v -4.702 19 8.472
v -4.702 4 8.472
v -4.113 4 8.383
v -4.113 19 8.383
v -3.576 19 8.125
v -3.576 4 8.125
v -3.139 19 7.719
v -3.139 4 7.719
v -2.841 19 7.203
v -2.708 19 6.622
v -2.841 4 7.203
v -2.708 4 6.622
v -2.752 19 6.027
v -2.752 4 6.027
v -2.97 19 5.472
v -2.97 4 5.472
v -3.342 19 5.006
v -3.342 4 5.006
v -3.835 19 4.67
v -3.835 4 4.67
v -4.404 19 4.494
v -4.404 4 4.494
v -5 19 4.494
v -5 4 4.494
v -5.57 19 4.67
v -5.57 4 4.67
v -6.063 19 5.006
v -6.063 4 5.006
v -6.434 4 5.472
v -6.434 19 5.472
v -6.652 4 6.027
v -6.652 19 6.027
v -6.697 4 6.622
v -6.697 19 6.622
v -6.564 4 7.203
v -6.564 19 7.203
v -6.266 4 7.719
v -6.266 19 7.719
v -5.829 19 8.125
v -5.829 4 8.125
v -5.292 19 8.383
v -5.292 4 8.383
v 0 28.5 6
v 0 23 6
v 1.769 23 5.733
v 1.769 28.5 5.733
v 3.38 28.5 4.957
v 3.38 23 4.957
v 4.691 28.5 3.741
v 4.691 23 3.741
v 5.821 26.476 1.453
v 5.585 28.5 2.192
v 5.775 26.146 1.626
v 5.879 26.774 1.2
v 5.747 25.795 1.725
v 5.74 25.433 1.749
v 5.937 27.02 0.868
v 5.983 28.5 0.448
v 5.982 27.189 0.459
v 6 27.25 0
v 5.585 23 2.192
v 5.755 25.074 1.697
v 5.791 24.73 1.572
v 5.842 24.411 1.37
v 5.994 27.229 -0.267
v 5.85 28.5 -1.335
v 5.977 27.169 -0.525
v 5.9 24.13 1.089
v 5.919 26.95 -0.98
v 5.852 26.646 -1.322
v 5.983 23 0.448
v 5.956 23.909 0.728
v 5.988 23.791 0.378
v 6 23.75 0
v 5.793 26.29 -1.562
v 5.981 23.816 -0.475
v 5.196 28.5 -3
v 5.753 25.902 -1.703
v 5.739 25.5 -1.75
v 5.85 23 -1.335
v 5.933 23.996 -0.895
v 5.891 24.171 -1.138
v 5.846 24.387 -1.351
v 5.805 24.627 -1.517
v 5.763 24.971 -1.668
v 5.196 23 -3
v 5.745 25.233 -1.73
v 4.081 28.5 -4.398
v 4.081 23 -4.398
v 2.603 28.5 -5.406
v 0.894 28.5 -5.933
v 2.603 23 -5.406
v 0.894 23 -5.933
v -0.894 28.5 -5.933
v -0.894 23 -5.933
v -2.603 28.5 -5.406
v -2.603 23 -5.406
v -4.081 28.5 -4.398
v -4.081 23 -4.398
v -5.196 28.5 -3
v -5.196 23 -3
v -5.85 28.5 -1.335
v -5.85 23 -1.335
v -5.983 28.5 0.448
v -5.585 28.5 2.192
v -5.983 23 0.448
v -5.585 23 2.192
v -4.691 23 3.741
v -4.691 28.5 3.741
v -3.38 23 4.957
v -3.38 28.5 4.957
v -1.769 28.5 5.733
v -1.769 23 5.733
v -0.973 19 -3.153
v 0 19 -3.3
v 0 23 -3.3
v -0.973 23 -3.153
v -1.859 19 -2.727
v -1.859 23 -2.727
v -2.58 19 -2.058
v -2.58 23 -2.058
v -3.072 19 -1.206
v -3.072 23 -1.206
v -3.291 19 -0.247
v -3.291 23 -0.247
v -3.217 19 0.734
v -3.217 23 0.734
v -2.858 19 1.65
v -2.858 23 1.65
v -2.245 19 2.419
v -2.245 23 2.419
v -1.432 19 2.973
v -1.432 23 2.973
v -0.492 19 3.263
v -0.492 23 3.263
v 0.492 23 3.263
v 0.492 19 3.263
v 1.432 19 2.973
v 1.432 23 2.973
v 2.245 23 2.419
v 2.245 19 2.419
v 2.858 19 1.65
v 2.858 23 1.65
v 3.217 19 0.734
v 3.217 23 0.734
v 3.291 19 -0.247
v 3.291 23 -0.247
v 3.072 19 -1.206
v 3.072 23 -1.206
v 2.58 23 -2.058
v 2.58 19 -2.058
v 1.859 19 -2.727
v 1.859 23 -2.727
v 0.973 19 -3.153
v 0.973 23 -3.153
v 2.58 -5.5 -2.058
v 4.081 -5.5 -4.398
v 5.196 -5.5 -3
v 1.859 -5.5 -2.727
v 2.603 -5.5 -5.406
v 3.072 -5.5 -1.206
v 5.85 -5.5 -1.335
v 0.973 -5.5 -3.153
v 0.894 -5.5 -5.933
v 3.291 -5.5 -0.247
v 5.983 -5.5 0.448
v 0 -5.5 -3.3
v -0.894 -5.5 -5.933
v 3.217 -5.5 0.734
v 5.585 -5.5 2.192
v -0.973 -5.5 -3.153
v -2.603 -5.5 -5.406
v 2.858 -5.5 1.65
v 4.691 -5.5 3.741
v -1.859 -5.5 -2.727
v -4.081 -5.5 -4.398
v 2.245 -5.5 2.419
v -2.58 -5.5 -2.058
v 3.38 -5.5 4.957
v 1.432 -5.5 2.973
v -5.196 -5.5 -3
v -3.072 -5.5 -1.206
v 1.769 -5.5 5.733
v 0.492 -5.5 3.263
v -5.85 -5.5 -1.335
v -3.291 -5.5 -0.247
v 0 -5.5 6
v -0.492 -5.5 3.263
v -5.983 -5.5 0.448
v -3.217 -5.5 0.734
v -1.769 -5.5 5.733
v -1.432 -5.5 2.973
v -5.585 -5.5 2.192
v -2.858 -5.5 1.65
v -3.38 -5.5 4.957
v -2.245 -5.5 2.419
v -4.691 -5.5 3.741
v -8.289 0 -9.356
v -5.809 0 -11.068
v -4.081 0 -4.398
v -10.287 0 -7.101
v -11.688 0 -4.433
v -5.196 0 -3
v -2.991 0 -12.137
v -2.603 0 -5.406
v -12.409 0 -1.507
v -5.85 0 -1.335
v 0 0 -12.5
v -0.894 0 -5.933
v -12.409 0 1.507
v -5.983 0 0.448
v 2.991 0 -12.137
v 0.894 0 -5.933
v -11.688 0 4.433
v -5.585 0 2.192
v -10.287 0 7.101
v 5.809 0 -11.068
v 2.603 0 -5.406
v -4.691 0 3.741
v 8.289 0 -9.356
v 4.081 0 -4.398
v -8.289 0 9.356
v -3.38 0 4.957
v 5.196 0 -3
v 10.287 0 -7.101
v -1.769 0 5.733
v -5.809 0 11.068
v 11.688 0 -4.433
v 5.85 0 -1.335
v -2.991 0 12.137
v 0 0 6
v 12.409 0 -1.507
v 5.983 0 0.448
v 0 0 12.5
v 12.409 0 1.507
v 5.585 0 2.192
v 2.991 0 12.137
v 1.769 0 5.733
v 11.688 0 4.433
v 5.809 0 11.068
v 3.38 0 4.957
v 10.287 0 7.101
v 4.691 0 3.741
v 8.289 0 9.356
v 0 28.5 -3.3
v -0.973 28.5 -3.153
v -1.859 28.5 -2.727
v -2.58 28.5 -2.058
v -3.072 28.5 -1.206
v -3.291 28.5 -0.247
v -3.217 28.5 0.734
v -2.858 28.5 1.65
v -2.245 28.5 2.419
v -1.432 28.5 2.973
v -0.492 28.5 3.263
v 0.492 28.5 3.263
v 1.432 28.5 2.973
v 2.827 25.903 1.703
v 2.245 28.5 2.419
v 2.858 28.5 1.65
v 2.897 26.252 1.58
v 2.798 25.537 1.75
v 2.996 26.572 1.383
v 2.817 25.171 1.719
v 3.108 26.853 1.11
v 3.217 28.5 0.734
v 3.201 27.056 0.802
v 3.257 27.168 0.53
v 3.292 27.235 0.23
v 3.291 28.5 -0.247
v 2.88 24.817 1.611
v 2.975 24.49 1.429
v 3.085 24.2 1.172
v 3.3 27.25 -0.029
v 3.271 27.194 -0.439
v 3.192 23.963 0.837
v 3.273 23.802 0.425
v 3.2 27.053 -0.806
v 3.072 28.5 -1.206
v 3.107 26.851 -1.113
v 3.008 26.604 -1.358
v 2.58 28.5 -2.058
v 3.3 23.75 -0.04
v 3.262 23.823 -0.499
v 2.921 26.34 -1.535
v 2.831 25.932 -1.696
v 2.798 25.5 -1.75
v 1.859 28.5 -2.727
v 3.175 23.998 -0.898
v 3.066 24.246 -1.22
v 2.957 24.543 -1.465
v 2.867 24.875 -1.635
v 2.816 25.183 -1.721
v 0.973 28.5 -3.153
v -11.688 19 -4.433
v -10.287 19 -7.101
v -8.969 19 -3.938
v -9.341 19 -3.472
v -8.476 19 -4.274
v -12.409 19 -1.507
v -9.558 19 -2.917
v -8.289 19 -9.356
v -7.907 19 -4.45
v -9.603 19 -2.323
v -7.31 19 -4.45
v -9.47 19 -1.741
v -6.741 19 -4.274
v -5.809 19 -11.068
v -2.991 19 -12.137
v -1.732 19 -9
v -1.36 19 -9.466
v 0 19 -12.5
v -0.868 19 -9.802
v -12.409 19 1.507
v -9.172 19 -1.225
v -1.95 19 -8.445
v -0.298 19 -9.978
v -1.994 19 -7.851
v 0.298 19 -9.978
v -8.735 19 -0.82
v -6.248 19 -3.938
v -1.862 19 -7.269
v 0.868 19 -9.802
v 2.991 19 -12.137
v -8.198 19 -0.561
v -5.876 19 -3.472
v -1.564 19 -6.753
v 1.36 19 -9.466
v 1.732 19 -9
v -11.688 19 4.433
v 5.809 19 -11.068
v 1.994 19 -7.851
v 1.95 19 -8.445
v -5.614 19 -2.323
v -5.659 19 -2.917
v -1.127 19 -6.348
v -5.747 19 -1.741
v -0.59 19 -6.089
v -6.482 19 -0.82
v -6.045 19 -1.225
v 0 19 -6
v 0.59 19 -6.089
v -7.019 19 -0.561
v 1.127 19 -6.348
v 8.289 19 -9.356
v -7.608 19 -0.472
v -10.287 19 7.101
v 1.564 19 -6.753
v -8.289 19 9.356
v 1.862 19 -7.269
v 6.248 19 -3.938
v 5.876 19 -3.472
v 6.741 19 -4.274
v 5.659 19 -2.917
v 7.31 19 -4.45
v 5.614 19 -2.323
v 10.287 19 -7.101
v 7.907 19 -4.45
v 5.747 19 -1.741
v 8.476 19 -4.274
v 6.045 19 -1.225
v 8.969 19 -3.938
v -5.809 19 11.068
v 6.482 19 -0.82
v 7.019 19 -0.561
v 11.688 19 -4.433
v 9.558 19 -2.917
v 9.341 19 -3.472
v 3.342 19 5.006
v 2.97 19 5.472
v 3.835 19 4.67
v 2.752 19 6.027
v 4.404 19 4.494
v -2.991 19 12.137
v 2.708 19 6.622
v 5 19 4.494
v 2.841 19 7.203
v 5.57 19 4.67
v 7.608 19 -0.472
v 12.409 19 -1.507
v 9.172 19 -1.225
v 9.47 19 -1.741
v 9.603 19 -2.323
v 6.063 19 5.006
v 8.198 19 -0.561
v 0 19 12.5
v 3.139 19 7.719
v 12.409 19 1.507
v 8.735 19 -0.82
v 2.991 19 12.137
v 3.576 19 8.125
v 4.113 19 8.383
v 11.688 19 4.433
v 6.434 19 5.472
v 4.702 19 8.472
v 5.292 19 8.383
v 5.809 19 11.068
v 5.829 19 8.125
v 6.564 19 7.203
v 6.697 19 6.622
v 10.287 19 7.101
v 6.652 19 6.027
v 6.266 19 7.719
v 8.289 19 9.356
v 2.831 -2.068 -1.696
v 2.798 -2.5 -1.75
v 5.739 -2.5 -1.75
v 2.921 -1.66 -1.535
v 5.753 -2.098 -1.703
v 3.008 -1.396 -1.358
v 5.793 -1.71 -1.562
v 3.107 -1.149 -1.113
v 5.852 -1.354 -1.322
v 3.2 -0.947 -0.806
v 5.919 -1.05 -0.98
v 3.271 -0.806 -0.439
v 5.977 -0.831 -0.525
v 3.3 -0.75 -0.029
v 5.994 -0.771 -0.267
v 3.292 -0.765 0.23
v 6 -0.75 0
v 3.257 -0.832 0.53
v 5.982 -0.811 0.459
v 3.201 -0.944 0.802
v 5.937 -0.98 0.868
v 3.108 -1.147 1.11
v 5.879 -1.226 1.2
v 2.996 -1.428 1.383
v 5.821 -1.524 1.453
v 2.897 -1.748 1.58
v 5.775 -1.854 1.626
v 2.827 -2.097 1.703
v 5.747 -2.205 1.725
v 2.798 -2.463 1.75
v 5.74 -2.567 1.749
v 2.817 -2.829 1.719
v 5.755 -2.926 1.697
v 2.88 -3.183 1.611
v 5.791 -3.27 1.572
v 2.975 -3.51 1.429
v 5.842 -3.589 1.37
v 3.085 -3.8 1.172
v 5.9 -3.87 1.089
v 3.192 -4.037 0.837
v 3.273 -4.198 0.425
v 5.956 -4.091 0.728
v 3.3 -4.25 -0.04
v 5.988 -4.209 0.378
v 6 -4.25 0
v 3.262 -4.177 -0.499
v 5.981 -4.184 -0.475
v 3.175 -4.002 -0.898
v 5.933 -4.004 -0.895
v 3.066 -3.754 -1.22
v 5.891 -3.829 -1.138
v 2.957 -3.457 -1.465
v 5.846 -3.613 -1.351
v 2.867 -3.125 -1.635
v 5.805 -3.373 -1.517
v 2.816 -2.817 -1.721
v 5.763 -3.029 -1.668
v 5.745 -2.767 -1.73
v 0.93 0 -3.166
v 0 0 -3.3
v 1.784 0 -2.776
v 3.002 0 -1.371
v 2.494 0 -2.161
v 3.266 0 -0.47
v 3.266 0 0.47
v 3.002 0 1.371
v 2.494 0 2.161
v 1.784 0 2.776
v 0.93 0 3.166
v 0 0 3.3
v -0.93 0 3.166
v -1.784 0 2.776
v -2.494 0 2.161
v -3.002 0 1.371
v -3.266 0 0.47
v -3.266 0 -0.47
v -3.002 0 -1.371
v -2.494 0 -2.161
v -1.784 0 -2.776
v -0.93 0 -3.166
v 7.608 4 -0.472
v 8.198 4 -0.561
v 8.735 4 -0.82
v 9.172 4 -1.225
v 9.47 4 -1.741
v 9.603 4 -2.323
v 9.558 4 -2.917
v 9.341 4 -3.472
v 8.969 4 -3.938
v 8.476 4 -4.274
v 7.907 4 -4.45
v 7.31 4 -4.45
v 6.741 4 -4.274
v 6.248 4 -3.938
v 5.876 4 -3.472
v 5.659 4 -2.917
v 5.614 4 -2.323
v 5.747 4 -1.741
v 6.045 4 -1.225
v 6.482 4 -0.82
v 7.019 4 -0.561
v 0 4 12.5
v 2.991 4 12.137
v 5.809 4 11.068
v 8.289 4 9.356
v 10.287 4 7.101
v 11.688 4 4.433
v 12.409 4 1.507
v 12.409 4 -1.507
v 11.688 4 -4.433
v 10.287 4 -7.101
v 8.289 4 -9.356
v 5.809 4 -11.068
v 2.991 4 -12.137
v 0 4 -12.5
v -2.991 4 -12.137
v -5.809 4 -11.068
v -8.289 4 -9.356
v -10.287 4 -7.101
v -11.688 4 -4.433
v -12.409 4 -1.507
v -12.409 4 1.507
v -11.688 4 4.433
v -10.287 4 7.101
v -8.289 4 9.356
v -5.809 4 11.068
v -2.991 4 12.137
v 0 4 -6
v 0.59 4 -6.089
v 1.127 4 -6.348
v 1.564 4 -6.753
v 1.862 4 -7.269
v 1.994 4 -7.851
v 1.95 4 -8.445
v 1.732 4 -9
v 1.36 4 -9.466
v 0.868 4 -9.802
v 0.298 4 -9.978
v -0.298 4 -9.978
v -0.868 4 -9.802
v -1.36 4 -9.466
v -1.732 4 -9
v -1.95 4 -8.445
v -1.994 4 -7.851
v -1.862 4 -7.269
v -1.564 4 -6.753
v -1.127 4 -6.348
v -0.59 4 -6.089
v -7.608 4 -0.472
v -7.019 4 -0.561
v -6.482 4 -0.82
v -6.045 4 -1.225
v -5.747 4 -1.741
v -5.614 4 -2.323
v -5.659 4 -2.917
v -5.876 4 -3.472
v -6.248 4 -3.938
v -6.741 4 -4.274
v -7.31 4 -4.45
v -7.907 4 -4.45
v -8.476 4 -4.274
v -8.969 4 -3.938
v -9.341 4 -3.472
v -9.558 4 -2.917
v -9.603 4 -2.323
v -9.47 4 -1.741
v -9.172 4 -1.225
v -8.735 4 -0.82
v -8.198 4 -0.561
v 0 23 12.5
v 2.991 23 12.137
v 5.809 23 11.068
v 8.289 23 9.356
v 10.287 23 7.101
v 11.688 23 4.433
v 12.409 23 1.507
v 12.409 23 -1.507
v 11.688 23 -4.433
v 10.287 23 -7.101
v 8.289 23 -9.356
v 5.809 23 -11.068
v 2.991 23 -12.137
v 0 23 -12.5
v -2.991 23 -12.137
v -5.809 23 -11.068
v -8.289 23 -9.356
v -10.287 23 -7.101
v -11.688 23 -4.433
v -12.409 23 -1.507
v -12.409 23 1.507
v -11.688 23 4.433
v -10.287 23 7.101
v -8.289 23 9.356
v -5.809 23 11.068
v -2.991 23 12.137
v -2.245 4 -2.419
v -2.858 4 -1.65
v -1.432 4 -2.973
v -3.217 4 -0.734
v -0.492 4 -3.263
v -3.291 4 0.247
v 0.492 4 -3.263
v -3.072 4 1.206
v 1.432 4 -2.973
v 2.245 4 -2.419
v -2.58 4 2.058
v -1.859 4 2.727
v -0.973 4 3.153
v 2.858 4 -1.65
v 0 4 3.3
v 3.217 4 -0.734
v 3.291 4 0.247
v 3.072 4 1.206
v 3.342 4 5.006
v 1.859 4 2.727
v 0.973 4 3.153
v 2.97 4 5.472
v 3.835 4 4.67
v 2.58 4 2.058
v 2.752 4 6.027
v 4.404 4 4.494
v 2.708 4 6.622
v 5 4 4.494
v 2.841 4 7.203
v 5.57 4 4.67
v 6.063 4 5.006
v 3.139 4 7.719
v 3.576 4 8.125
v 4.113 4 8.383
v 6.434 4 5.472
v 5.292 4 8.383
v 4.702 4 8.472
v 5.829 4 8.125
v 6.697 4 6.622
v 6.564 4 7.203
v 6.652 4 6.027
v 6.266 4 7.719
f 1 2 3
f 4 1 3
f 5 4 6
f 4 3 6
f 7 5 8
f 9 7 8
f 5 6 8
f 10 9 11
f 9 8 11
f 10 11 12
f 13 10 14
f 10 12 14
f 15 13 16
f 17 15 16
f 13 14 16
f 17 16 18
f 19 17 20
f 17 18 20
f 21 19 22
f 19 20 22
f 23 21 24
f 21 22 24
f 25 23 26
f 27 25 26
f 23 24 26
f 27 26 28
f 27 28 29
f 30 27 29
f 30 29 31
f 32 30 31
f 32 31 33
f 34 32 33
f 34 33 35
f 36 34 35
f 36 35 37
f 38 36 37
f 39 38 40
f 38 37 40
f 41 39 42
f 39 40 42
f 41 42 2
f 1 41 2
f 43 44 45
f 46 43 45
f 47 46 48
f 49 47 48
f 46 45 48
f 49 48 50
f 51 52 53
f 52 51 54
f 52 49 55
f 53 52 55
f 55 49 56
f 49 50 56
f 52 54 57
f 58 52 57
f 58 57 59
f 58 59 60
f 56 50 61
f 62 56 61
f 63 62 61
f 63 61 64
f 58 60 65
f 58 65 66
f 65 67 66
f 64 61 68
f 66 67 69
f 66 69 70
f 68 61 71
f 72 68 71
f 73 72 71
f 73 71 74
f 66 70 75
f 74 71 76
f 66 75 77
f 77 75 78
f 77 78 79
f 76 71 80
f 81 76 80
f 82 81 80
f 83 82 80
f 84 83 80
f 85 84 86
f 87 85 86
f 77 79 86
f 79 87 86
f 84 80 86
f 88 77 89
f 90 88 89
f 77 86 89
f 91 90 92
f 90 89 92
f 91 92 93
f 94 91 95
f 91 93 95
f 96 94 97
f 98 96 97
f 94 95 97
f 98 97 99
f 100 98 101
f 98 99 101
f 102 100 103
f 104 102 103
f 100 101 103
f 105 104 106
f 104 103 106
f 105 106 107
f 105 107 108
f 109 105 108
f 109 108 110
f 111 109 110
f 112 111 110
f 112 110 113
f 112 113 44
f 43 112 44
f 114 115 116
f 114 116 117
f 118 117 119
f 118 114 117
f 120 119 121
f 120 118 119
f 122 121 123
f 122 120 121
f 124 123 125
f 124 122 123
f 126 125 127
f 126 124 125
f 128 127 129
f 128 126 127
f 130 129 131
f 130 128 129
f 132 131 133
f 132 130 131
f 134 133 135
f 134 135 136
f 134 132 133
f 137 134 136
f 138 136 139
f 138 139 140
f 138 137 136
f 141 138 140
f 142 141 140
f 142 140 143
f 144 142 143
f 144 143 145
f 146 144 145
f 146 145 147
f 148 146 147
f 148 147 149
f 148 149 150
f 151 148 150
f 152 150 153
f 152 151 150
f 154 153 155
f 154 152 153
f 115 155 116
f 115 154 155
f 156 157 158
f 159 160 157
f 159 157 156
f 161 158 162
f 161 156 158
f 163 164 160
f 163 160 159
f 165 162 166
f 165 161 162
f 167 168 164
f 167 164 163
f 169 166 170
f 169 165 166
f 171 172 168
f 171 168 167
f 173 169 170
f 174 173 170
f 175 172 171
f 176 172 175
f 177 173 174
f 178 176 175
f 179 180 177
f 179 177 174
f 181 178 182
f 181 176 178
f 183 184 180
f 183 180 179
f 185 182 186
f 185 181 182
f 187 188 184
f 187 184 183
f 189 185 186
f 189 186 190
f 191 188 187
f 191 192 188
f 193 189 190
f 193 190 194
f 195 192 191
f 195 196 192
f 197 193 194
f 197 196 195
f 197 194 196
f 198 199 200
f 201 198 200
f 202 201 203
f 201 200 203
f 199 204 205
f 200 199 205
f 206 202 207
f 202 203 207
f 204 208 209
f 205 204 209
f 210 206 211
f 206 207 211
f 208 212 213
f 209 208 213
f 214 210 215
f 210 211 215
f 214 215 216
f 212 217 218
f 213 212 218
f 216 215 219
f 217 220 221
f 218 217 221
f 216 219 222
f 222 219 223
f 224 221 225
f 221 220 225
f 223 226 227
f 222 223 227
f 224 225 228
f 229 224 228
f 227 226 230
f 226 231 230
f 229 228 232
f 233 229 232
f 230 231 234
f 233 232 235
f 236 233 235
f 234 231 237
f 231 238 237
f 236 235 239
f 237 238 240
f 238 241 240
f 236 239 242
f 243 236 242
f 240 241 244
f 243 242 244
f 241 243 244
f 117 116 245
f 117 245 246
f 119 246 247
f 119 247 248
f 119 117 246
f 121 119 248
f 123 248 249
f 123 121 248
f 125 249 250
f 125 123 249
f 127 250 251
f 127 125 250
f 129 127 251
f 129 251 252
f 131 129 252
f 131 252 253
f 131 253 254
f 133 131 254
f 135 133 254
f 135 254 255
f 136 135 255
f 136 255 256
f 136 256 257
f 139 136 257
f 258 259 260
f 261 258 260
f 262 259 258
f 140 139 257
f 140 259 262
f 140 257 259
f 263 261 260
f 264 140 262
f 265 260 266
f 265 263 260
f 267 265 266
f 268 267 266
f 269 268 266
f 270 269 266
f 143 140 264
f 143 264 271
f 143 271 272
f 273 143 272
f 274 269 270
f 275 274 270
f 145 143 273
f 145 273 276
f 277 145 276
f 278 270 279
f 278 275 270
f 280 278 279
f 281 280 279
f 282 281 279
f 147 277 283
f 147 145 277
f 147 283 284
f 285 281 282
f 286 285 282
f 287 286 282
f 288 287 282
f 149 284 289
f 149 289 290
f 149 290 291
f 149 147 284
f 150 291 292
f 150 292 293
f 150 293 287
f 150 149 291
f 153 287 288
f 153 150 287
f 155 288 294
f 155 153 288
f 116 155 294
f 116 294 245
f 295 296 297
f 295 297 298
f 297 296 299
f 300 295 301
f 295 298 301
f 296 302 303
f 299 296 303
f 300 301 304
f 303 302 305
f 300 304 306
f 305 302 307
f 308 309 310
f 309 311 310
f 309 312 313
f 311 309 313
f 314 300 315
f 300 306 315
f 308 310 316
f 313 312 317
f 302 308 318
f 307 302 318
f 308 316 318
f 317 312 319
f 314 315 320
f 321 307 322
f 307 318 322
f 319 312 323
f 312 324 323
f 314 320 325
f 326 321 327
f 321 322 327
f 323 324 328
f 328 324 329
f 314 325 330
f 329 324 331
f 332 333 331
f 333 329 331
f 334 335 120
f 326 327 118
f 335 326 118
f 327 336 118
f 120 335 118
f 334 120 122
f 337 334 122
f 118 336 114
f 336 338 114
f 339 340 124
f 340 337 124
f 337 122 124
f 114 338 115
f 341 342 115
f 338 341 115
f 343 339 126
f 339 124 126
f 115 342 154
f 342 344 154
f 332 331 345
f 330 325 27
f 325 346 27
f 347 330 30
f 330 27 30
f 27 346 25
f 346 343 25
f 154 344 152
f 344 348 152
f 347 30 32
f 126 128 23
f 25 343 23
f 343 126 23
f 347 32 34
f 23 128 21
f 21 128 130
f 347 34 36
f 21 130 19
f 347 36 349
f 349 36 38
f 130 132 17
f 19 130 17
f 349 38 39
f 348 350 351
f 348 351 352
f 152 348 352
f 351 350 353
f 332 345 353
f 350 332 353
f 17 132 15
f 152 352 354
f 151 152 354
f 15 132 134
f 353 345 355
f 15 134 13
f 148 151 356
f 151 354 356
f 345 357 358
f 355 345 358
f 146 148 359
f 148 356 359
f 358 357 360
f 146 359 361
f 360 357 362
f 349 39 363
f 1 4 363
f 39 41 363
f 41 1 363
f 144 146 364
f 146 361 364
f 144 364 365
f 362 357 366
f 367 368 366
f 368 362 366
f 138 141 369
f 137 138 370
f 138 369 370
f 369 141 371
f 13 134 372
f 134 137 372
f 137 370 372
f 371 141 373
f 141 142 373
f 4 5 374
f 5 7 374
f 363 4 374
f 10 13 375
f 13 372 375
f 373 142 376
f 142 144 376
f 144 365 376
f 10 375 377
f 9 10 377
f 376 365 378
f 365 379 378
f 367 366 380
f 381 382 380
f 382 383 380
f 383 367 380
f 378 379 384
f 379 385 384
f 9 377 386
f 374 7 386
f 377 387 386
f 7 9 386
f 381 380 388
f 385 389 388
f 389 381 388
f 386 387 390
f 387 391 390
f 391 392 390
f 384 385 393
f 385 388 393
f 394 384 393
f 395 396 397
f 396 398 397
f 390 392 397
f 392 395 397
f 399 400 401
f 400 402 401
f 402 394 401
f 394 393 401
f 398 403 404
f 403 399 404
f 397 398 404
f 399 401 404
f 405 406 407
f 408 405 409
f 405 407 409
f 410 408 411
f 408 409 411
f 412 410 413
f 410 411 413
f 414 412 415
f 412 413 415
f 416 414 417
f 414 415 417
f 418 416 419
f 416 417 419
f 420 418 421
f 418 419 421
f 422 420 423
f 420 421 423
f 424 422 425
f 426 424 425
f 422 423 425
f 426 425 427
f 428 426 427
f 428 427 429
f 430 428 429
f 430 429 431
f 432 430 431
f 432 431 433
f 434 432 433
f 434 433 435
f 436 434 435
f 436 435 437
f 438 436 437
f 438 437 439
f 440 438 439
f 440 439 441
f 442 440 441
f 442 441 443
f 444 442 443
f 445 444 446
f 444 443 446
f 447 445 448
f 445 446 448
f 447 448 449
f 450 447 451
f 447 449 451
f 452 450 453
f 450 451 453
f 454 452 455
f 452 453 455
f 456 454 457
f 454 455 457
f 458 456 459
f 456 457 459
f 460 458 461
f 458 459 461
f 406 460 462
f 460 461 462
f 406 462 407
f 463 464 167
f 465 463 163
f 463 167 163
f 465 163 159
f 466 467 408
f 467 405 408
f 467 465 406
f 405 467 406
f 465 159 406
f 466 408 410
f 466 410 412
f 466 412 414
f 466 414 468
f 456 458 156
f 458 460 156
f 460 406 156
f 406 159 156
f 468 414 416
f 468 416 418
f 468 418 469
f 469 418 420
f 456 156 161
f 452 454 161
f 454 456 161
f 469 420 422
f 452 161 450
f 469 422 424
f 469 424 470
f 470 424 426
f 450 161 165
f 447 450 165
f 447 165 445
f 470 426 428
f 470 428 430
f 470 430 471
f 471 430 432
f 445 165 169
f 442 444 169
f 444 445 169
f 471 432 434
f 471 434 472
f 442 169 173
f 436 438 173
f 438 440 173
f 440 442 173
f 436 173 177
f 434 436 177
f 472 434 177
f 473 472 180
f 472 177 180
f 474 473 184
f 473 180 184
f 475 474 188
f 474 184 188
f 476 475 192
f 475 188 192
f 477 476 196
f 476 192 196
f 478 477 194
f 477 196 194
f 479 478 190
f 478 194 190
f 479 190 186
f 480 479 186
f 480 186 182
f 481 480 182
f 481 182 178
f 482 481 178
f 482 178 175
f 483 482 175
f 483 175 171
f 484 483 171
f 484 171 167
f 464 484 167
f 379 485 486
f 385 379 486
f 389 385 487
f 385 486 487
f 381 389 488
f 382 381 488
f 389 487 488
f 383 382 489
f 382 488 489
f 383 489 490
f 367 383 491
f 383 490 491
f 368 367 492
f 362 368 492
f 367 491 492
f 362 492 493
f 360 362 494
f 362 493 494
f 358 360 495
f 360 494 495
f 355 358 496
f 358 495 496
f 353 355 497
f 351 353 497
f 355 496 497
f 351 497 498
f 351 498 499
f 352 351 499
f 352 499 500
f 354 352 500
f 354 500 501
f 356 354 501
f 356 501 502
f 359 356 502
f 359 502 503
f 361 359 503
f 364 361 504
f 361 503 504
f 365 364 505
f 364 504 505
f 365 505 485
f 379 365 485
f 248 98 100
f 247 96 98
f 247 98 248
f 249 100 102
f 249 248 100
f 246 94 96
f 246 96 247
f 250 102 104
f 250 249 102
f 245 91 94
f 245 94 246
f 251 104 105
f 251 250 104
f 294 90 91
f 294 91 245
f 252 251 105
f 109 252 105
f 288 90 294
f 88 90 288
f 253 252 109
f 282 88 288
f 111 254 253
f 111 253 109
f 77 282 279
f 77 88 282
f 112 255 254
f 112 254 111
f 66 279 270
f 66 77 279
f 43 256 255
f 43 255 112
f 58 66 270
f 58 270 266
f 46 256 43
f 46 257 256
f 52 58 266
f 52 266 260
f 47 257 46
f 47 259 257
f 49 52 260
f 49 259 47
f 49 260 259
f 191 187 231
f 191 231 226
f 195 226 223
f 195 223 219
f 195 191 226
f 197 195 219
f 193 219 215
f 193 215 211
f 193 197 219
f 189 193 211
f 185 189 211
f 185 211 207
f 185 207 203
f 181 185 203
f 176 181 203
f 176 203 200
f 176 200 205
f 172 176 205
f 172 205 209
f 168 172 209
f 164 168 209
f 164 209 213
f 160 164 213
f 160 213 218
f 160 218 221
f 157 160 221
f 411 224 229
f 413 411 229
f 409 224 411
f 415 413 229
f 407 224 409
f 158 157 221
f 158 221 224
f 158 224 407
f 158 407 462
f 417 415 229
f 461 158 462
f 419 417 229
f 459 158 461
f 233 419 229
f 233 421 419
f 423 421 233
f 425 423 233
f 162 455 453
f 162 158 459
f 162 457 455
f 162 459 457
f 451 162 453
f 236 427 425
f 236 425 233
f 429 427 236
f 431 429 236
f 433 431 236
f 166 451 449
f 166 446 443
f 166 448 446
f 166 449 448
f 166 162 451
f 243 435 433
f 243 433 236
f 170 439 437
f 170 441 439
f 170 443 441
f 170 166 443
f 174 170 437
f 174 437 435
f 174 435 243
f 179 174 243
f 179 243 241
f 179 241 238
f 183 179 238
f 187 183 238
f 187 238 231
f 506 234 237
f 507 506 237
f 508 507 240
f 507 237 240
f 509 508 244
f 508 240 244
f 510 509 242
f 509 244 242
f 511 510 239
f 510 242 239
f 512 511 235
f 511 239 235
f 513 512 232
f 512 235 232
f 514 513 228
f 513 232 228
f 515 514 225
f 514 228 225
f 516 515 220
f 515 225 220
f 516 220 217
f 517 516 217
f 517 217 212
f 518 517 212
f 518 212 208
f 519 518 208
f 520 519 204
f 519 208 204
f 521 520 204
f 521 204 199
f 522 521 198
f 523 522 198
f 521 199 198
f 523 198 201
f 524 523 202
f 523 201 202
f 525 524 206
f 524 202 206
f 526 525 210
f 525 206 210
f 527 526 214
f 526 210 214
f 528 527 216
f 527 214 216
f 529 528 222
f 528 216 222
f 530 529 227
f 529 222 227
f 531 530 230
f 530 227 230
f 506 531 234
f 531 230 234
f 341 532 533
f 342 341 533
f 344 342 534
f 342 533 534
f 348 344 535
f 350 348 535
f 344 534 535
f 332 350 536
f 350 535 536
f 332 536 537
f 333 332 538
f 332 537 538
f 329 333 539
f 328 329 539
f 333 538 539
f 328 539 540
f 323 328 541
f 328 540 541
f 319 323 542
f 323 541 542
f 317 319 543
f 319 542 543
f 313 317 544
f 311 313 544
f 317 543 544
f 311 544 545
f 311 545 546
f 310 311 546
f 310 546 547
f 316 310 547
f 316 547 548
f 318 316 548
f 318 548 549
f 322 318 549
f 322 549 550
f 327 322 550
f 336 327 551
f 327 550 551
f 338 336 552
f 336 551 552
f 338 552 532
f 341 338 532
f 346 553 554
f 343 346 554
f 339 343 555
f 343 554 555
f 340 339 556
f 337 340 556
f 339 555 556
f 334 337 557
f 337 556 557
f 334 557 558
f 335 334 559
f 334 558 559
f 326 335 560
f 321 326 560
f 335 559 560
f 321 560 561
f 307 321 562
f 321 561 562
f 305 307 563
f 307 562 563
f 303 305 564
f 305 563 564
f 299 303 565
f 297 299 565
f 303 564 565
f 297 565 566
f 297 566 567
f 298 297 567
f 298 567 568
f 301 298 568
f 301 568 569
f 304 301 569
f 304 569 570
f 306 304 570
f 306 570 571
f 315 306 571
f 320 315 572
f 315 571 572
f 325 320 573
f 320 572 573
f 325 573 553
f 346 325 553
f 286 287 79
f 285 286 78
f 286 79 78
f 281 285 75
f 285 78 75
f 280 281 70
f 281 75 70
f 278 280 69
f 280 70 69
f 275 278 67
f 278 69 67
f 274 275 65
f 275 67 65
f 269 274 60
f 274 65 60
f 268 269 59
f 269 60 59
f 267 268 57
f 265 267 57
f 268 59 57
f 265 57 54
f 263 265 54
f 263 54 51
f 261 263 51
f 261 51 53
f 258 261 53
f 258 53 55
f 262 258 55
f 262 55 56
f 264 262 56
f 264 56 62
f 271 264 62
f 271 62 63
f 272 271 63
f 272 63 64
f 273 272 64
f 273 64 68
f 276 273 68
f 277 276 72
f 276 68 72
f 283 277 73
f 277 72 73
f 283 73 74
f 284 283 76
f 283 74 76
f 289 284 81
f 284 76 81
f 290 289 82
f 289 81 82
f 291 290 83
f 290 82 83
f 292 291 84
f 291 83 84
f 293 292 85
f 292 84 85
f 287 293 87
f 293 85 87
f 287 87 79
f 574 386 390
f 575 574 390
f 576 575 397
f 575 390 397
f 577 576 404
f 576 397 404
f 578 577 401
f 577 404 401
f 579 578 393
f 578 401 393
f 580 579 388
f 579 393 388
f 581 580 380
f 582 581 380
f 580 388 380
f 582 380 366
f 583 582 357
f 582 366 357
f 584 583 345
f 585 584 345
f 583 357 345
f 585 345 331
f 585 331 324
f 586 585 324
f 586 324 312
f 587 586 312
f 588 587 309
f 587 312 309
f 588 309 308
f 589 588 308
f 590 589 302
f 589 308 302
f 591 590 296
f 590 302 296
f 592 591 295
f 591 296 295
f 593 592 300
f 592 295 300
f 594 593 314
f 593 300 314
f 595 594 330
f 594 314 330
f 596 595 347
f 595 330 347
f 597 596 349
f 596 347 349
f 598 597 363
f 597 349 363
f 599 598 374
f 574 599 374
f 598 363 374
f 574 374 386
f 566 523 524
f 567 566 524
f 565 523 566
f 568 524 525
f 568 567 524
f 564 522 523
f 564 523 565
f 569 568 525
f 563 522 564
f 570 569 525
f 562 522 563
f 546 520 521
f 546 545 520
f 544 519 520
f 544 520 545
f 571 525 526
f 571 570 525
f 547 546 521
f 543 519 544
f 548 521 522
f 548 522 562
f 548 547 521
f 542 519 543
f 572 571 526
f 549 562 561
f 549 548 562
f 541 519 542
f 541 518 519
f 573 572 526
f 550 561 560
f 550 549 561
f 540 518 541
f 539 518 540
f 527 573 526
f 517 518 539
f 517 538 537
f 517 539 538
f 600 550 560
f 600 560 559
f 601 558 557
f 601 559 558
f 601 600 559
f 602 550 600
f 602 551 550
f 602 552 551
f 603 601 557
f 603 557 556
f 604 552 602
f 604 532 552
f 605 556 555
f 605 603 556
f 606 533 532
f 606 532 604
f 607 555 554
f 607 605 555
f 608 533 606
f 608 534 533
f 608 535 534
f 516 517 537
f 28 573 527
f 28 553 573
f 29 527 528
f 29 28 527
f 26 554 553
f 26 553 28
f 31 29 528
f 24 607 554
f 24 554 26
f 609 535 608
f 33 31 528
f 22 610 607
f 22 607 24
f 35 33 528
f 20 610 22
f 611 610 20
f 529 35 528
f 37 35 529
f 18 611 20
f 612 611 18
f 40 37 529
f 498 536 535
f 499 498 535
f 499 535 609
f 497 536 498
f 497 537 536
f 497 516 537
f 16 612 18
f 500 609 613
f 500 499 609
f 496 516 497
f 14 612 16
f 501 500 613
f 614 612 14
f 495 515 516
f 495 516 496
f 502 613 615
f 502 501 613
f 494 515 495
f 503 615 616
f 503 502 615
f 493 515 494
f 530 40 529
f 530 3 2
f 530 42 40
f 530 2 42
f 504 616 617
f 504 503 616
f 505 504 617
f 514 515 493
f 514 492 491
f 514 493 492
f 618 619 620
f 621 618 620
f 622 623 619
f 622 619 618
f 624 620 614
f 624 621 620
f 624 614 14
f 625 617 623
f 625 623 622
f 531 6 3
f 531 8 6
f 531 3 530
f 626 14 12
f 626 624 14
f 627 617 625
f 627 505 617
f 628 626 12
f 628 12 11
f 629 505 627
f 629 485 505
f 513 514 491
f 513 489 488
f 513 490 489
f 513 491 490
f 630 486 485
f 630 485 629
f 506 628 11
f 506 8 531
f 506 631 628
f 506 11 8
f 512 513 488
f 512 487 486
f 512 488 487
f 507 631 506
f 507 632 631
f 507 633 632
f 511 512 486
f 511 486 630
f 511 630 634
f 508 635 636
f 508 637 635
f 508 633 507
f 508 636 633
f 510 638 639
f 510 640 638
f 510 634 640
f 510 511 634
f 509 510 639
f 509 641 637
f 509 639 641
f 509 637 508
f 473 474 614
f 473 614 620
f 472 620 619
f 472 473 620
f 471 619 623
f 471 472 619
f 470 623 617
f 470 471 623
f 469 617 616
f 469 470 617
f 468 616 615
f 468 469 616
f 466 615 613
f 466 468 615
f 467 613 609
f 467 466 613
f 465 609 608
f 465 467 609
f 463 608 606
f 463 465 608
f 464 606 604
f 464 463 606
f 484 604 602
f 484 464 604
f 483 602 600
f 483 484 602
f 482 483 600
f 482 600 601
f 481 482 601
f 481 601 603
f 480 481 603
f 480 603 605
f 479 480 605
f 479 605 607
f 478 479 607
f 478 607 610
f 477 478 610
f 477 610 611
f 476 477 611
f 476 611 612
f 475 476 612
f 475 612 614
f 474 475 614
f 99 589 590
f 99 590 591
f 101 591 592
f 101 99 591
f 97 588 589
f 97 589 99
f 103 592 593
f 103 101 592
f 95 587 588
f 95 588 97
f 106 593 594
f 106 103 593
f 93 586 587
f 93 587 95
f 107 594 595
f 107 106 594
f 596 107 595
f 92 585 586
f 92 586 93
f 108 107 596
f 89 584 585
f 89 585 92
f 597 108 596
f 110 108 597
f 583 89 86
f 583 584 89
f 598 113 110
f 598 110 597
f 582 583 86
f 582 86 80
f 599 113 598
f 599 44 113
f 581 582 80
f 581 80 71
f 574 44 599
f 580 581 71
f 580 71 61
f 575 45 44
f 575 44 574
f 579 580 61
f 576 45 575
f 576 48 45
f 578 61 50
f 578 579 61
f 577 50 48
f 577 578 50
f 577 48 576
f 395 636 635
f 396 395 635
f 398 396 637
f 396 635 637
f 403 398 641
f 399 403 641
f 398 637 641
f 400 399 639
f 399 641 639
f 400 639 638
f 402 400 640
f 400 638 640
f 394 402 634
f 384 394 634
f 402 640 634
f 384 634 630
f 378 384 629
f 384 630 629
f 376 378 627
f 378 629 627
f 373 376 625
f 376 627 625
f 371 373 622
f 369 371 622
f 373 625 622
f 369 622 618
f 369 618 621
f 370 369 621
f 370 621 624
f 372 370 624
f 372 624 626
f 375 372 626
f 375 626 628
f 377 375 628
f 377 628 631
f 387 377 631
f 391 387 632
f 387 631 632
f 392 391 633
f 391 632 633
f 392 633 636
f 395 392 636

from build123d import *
from build123d.topology import SkipClean

# Parameters (mm, degrees)
SKETCH1_R               = 12.5
SKETCH1_R_2             = 3.3
BOSS_EXTRUDE1_DEPTH     = 4
BOSS_EXTRUDE7_START     = 5.5
SKETCH8_R               = 6
SKETCH8_R_2             = 3.3
BOSS_EXTRUDE7_DEPTH     = 5.5
SKETCH9_R               = 2
BOSS_EXTRUDE8_DEPTH     = 15
SKETCH10_R              = 12.5
SKETCH10_R_2            = 3.3
BOSS_EXTRUDE9_DEPTH     = 4
SKETCH11_R              = 6
SKETCH11_R_2            = 3.3
BOSS_EXTRUDE10_DEPTH    = 5.5
CUT_EXTRUDE3_REACH      = 38.204
CUT_EXTRUDE3_END_RADIUS = 3.3
SKETCH12_R              = 1.75
CUT_EXTRUDE4_REACH      = 38.204
CUT_EXTRUDE4_END_RADIUS = 3.3
SKETCH13_R              = 1.75


with BuildPart() as part:
    # Sketch1 → Boss-Extrude1 (new body)
    with BuildSketch(Plane(origin=(0, 0, 0), x_dir=(1, 0, 0), z_dir=(0, 1, 0))):
        with Locations(Location((0, 0, 0), (0, 0, 270))):
            Circle(SKETCH1_R)
        with Locations(Location((0, 0, 0), (0, 0, 270))):
            Circle(SKETCH1_R_2, mode=Mode.SUBTRACT)
    extrude(amount=BOSS_EXTRUDE1_DEPTH)

    # Sketch8 → Boss-Extrude7 (add)
    with SkipClean():  # the faces are left unmerged after this step: merging them gives an invalid solid
        with BuildSketch(Plane.XZ.offset(BOSS_EXTRUDE7_START)):
            with Locations(Location((0, 0, 0), (0, 0, 90))):
                Circle(SKETCH8_R)
            with Locations(Location((0, 0, 0), (0, 0, 270))):
                Circle(SKETCH8_R_2, mode=Mode.SUBTRACT)
        extrude(amount=-BOSS_EXTRUDE7_DEPTH)

    # Sketch9 → Boss-Extrude8 (add)
    with SkipClean():  # the faces are left unmerged after this step: merging them gives an invalid solid
        with BuildSketch(Plane(origin=(0, 4, 0), x_dir=(1, 0, 0), z_dir=(0, 1, 0))):
            with Locations(Location((0, 8, 0), (0, 0, 270))):
                Circle(SKETCH9_R)
            with Locations(Location((7.60845213, 2.472135955, 0), (0, 0, 270))):
                Circle(SKETCH9_R)
            with Locations(Location((4.702282018, -6.472135955, 0), (0, 0, 270))):
                Circle(SKETCH9_R)
            with Locations(Location((-4.702282018, -6.472135955, 0), (0, 0, 270))):
                Circle(SKETCH9_R)
            with Locations(Location((-7.60845213, 2.472135955, 0), (0, 0, 270))):
                Circle(SKETCH9_R)
        extrude(amount=BOSS_EXTRUDE8_DEPTH)

    # Sketch10 → Boss-Extrude9 (add)
    with SkipClean():  # the faces are left unmerged after this step: merging them gives an invalid solid
        with BuildSketch(Plane(origin=(0, 19, 0), x_dir=(1, 0, 0), z_dir=(0, 1, 0))):
            with Locations(Location((0, 0, 0), (0, 0, 270))):
                Circle(SKETCH10_R)
            with Locations(Location((0, 0, 0), (0, 0, 90))):
                Circle(SKETCH10_R_2, mode=Mode.SUBTRACT)
        extrude(amount=BOSS_EXTRUDE9_DEPTH)

    # Sketch11 → Boss-Extrude10 (add)
    with SkipClean():  # the faces are left unmerged after this step: merging them gives an invalid solid
        with BuildSketch(Plane(origin=(0, 23, 0), x_dir=(1, 0, 0), z_dir=(0, 1, 0))):
            with Locations(Location((0, 0, 0), (0, 0, 270))):
                Circle(SKETCH11_R)
            with Locations(Location((0, 0, 0), (0, 0, 90))):
                Circle(SKETCH11_R_2, mode=Mode.SUBTRACT)
        extrude(amount=BOSS_EXTRUDE10_DEPTH)

    # Cut-Extrude3: up to this cylinder (the profile starts outside it)
    with SkipClean():  # the faces are left unmerged after this step: merging them gives an invalid solid
        cut_extrude3_end = Plane(origin=(0, 25.5, 0), z_dir=(0, -1, 0)) * Cylinder(CUT_EXTRUDE3_END_RADIUS, 84.008, mode=Mode.PRIVATE)
        # Sketch12 → Cut-Extrude3 (cut, up to the surface)
        with BuildSketch(Plane(origin=(6, 0, 0), x_dir=(0, 0, -1), z_dir=(1, 0, 0)), mode=Mode.PRIVATE) as cut_extrude3_sk1:
            with Locations((0, 25.5)):
                Circle(SKETCH12_R)
        cut_extrude3_tool1 = extrude(cut_extrude3_sk1.sketch, amount=-CUT_EXTRUDE3_REACH, mode=Mode.PRIVATE) - cut_extrude3_end
        add(cut_extrude3_tool1.solids().sort_by_distance((6, 25.5, 0))[0], mode=Mode.SUBTRACT)

    # Cut-Extrude4: up to this cylinder (the profile starts outside it)
    with SkipClean():  # the faces are left unmerged after this step: merging them gives an invalid solid
        cut_extrude4_end = Plane(origin=(0, -2.5, 0), z_dir=(0, -1, 0)) * Cylinder(CUT_EXTRUDE4_END_RADIUS, 84.008, mode=Mode.PRIVATE)
        # Sketch13 → Cut-Extrude4 (cut, up to the surface)
        with BuildSketch(Plane(origin=(6, 0, 0), x_dir=(0, 0, -1), z_dir=(1, 0, 0)), mode=Mode.PRIVATE) as cut_extrude4_sk1:
            with Locations((0, -2.5)):
                Circle(SKETCH13_R)
        cut_extrude4_tool1 = extrude(cut_extrude4_sk1.sketch, amount=-CUT_EXTRUDE4_REACH, mode=Mode.PRIVATE) - cut_extrude4_end
        add(cut_extrude4_tool1.solids().sort_by_distance((6, -2.5, 0))[0], mode=Mode.SUBTRACT)


solid = part.part
